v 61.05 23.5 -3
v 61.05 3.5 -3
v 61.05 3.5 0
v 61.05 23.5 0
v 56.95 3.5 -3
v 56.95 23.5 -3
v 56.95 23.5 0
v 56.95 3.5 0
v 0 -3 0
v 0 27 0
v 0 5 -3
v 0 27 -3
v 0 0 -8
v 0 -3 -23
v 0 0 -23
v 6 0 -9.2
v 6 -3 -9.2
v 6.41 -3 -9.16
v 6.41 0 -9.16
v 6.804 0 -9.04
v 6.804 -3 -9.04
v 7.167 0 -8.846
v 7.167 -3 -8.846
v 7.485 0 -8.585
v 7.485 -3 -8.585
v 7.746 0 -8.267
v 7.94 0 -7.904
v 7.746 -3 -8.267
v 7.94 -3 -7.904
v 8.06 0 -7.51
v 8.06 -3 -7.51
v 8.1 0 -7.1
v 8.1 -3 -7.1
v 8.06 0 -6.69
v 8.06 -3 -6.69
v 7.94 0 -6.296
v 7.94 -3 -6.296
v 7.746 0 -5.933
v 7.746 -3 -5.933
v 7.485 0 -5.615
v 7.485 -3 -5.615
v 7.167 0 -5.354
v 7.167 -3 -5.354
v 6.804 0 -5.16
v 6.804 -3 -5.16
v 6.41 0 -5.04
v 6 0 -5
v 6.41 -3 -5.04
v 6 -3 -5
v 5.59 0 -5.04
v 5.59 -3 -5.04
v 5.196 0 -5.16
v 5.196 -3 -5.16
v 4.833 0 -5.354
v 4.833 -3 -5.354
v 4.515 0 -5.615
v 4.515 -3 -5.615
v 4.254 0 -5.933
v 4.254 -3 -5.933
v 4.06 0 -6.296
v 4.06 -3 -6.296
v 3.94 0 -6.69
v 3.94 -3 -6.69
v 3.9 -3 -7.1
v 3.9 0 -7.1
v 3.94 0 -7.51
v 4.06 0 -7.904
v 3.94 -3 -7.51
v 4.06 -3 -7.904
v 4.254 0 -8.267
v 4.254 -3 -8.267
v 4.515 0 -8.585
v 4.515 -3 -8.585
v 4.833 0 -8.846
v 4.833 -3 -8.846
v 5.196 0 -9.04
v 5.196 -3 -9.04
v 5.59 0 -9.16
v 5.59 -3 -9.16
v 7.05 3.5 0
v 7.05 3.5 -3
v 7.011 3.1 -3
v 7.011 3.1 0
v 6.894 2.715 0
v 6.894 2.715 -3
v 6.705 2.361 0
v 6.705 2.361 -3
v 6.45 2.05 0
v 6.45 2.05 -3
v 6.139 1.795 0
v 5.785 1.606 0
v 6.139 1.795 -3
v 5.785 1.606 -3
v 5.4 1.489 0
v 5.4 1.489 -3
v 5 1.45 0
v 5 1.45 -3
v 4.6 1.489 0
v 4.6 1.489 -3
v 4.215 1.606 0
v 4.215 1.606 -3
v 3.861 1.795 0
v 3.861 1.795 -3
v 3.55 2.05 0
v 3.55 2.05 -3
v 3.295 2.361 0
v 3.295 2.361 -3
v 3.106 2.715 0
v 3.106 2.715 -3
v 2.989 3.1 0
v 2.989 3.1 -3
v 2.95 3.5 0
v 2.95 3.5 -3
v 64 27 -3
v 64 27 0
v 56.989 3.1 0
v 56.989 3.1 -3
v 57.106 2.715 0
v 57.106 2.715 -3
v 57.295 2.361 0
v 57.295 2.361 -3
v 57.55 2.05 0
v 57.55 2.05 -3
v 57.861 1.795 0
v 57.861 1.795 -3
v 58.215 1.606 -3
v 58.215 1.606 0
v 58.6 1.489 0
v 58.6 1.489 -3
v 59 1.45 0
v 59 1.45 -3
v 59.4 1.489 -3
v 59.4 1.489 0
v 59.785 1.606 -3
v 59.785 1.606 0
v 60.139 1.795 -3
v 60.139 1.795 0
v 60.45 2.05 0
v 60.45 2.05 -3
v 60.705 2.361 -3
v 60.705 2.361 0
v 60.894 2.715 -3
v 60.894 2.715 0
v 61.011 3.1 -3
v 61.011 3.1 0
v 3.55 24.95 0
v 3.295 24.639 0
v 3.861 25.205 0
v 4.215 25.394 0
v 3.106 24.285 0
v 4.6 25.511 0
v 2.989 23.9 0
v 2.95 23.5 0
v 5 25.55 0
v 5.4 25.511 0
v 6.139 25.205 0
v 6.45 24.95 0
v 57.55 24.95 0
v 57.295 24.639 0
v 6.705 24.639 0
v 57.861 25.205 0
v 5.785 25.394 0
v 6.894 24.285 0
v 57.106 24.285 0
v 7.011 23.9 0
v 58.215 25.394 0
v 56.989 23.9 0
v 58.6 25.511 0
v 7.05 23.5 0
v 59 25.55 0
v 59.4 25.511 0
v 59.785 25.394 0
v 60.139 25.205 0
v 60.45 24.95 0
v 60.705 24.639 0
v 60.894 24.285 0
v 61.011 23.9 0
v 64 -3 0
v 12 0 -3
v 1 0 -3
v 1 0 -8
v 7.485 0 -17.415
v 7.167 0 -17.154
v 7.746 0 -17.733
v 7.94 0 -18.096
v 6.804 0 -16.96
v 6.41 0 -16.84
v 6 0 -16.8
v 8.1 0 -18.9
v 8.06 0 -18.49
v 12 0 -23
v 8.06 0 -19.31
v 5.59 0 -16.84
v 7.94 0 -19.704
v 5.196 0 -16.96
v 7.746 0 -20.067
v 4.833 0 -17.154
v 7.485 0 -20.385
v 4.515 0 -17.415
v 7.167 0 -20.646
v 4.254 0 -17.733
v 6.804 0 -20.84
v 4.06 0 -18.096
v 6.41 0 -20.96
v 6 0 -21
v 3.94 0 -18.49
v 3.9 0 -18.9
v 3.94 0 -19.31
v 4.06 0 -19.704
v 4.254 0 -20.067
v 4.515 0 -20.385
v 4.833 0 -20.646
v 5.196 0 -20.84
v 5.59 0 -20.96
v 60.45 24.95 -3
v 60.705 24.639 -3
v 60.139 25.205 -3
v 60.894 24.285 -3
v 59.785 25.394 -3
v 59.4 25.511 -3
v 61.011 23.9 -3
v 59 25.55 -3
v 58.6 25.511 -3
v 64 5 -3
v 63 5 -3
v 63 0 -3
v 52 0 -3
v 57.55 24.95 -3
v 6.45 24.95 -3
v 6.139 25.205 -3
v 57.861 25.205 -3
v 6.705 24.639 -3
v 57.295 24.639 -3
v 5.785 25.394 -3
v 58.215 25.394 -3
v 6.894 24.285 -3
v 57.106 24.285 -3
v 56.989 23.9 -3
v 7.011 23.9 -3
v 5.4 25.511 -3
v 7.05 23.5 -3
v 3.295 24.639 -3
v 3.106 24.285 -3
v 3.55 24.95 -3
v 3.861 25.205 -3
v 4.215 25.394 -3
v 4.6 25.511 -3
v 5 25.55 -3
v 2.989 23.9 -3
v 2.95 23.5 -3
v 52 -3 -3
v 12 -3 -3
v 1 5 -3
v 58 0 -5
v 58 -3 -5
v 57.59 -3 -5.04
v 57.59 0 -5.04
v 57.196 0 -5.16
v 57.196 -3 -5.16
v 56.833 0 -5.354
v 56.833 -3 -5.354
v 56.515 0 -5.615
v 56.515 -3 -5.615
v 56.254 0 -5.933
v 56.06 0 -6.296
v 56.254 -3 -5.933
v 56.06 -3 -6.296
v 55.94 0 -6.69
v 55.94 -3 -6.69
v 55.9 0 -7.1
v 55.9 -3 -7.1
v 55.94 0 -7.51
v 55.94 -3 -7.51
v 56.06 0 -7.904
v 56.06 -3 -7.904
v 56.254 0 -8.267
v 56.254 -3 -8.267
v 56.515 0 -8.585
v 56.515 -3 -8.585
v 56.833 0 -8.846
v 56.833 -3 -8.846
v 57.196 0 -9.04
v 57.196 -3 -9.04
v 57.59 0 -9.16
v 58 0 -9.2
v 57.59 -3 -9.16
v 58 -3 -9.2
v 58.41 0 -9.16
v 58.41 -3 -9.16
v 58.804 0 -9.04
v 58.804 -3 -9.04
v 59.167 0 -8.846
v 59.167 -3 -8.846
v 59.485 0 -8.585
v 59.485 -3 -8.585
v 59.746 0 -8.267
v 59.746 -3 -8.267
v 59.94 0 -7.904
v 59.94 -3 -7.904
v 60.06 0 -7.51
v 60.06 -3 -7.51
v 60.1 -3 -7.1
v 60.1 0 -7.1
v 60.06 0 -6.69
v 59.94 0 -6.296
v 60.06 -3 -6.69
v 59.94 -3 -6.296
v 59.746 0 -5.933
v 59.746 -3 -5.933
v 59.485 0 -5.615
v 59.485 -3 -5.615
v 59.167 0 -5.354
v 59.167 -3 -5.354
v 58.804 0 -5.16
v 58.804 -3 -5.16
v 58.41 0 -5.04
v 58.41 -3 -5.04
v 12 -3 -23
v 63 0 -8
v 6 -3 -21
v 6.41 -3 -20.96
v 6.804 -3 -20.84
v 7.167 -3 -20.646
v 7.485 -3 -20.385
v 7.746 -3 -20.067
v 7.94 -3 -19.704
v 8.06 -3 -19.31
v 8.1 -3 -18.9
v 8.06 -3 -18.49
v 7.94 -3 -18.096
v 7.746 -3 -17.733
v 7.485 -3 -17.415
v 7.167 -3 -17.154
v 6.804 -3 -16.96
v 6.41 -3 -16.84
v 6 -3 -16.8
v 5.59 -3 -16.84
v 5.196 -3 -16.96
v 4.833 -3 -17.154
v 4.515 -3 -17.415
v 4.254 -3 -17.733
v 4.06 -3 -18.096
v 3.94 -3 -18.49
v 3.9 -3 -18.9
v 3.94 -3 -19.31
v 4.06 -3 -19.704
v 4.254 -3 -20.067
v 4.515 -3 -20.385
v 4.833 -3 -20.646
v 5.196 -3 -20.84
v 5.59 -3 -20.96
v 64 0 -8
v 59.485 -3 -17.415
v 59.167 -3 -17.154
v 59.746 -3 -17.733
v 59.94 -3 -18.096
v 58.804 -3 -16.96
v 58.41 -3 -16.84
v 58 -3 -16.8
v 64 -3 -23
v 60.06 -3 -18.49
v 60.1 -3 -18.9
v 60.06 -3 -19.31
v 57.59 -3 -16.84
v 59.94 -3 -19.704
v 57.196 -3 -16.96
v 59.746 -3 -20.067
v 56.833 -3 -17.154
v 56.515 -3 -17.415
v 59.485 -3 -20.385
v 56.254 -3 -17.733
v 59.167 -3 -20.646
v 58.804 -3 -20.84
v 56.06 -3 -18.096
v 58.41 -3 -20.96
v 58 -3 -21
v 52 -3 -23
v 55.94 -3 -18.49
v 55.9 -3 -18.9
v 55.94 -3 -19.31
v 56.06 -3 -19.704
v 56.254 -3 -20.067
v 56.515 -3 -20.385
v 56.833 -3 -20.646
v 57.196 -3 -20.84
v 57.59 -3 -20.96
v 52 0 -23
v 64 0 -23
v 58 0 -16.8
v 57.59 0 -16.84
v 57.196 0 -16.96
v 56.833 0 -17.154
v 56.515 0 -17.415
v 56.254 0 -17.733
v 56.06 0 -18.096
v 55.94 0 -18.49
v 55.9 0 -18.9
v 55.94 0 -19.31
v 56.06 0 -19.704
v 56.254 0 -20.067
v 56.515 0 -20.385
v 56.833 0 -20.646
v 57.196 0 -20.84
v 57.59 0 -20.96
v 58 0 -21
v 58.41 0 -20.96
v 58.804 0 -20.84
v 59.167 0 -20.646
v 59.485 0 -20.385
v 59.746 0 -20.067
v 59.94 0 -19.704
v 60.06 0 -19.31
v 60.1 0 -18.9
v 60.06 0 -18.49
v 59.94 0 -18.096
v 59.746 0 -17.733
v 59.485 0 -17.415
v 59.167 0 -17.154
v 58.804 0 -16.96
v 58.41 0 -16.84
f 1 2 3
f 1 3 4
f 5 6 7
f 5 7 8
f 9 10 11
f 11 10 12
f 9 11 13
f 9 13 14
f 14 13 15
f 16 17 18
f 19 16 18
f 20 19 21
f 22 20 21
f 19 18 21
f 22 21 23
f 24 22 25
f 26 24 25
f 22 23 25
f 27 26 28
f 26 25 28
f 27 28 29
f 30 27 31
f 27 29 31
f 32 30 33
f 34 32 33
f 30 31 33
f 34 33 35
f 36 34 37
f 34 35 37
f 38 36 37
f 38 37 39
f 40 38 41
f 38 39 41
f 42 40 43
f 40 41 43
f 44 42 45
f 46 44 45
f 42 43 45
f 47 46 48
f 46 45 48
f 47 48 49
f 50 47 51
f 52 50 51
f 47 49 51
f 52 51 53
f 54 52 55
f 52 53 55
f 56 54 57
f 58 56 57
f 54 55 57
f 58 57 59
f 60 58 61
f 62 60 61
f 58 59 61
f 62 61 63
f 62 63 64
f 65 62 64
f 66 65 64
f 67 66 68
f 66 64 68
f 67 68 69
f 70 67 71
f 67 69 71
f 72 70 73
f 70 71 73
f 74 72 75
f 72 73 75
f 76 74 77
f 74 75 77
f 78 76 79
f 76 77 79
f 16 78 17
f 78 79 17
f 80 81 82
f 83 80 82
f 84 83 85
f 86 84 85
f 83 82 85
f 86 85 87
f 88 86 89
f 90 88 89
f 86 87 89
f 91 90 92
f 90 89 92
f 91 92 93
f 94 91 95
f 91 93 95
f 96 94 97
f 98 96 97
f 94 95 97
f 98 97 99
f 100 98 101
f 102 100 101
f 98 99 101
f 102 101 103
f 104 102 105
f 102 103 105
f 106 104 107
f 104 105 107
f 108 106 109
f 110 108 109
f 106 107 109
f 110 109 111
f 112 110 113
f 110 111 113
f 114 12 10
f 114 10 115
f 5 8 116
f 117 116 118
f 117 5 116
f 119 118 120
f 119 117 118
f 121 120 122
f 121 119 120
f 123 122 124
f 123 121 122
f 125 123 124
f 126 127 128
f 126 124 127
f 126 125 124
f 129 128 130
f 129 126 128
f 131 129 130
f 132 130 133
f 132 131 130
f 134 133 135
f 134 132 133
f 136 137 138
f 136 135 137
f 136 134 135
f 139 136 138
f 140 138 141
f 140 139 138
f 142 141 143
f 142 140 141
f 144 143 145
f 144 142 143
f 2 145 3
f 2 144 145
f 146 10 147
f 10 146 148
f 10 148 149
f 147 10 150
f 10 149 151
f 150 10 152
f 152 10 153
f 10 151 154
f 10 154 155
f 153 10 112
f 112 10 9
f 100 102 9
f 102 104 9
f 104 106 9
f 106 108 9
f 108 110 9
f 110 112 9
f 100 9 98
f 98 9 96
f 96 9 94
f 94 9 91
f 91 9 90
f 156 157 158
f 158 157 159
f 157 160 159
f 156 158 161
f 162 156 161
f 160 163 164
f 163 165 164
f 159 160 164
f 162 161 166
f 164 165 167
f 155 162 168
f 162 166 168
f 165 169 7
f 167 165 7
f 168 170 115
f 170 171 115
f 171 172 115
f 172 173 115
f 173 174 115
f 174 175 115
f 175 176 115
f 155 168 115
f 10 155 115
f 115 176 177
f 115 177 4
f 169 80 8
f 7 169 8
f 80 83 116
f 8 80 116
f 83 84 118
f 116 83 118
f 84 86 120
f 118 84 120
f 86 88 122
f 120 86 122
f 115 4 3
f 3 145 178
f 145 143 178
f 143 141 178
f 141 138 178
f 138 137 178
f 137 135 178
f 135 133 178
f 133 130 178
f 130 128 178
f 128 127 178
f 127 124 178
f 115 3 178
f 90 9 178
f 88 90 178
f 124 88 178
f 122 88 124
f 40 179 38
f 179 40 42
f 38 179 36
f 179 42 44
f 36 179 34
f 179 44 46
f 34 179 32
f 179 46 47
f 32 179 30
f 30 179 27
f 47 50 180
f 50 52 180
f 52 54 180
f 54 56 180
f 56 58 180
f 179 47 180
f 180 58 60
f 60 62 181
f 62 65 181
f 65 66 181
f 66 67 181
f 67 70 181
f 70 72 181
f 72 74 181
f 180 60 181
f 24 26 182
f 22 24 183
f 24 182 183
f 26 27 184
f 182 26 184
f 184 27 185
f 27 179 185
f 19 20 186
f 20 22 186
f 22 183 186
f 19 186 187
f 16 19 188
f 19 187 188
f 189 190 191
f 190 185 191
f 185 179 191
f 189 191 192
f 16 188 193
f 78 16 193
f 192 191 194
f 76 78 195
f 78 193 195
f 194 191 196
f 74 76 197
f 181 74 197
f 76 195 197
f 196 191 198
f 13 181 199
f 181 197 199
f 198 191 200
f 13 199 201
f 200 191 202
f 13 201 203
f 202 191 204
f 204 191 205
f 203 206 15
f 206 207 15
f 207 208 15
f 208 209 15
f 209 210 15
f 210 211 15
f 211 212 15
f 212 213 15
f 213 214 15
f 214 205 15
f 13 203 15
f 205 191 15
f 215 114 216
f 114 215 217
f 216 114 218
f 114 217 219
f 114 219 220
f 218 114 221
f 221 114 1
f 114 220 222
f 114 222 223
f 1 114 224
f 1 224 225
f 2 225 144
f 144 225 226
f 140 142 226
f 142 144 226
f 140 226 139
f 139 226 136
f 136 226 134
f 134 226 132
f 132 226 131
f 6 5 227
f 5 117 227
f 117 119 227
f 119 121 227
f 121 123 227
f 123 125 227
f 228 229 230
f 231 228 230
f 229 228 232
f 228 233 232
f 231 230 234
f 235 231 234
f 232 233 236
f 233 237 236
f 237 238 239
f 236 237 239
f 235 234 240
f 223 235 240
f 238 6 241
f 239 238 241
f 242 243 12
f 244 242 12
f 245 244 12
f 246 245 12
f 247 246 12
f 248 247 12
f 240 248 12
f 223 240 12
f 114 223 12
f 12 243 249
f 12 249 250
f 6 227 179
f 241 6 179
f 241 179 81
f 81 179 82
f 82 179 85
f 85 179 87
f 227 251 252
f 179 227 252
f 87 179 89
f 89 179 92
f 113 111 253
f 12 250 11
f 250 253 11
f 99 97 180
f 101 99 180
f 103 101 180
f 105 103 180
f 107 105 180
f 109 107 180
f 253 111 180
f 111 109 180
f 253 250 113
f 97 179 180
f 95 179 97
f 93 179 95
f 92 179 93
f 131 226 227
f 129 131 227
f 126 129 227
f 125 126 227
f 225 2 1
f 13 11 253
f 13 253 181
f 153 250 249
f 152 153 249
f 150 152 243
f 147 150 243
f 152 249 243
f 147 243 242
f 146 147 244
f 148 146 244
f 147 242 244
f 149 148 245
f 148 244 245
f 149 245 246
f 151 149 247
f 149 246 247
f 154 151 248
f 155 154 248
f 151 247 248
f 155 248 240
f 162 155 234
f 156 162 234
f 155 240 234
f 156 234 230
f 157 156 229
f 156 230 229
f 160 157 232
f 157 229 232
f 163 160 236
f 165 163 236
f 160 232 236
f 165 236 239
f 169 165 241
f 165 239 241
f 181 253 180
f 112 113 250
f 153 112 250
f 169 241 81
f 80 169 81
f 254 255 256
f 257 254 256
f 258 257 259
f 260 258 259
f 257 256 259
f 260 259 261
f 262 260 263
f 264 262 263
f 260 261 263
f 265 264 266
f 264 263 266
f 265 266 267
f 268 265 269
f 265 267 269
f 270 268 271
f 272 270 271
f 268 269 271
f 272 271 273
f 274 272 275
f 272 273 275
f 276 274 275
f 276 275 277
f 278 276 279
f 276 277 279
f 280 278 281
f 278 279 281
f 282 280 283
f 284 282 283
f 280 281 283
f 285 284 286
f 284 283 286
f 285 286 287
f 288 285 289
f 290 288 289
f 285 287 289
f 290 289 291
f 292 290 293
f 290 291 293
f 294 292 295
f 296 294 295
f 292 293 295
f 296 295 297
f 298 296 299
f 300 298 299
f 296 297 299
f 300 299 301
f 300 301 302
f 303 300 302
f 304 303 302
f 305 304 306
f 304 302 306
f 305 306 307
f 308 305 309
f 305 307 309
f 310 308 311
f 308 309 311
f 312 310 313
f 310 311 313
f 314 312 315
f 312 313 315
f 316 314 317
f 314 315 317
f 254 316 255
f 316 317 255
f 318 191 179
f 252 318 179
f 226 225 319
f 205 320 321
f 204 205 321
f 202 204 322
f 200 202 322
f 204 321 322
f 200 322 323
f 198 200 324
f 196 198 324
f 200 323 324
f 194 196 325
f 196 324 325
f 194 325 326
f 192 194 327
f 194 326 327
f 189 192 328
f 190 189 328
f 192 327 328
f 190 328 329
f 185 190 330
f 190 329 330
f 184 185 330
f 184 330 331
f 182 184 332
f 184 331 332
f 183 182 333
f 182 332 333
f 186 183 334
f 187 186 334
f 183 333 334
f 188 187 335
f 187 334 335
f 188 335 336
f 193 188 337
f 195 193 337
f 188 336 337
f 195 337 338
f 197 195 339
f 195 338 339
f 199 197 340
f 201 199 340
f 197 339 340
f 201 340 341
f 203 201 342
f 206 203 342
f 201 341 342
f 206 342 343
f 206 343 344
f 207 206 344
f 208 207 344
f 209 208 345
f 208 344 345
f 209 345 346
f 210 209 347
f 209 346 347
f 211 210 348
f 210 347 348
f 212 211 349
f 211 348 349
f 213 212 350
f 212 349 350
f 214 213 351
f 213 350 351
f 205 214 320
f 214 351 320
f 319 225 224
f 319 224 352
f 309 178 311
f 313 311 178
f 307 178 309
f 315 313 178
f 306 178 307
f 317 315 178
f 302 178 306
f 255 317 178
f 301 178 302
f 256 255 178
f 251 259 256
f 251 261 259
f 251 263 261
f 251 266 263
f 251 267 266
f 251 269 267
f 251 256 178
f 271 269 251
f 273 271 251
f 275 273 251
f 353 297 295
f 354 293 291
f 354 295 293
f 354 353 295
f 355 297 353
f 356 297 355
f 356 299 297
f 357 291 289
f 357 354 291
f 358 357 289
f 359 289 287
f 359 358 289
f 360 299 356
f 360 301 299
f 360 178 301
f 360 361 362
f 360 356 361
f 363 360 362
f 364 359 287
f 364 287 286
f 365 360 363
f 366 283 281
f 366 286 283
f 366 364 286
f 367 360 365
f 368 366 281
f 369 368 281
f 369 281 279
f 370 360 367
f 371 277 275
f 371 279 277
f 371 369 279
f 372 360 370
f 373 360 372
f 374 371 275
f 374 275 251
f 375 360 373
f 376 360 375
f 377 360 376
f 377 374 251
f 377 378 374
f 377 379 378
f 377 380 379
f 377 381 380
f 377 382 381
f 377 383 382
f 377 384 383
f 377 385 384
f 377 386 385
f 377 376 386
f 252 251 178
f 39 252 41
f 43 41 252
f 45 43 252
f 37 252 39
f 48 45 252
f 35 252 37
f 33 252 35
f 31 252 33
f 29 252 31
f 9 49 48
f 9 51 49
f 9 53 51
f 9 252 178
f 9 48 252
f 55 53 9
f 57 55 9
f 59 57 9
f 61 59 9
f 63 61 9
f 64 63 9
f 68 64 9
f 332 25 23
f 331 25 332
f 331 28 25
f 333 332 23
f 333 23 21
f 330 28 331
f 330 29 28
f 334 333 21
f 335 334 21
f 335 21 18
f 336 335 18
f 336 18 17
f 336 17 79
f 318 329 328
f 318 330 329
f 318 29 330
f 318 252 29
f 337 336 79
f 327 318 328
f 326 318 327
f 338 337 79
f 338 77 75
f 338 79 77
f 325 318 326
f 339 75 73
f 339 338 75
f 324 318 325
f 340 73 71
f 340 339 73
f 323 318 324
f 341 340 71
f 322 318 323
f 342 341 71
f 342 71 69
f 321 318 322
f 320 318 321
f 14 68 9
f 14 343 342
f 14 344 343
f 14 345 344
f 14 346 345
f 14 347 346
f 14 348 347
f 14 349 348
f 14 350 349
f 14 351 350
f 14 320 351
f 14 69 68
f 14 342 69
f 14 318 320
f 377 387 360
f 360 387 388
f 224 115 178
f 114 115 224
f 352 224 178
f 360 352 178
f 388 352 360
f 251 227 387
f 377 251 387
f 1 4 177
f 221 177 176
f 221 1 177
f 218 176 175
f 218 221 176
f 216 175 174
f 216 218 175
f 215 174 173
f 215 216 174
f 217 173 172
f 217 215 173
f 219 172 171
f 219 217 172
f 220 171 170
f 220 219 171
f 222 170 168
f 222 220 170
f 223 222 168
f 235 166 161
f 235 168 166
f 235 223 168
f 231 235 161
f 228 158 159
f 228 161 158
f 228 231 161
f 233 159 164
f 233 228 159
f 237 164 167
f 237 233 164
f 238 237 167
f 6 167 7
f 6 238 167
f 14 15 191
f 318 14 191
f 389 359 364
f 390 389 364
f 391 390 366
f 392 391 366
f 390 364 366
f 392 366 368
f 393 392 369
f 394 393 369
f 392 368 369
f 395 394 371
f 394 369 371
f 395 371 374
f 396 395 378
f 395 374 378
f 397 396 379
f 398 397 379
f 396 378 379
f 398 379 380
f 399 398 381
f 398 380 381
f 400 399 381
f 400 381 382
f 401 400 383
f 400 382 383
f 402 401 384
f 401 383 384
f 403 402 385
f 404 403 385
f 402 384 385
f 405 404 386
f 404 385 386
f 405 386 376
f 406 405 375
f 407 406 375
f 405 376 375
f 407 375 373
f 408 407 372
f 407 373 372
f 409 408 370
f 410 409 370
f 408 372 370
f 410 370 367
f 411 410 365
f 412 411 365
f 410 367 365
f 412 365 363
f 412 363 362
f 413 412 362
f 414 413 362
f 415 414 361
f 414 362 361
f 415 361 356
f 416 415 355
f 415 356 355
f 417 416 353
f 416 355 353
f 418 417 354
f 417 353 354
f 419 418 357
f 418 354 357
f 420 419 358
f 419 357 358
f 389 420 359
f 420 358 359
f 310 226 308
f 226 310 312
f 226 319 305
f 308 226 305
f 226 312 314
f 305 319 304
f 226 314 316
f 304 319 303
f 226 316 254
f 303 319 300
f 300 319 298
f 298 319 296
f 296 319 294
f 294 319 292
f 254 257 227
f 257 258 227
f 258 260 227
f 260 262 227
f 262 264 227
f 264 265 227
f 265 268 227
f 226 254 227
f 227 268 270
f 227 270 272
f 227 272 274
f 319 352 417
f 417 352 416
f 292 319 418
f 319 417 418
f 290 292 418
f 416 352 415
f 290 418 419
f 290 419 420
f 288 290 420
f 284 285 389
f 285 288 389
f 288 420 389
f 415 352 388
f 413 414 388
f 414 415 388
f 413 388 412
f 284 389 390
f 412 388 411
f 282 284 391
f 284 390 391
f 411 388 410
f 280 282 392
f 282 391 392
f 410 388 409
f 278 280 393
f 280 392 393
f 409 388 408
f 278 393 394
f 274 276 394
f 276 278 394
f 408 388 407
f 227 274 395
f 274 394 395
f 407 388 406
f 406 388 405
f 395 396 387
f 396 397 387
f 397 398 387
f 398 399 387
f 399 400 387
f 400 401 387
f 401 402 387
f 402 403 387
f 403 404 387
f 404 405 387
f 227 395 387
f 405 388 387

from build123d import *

# Parameters (mm, degrees)
BOSS_EXTRUDE1_DEPTH = 3
SKETCH2_R           = 2.1
CUT_EXTRUDE1_DEPTH  = 3
BOSS_EXTRUDE2_DEPTH = 27
CUT_EXTRUDE2_DEPTH  = 27
RIB1_REACH          = 75.171
SKETCH5_WALL_W      = 155.413132852
SKETCH5_WALL_H      = 1
RIB2_REACH          = 75.171
SKETCH6_WALL_W      = 155.413132852
SKETCH6_WALL_H      = 1


with BuildPart() as part:
    # Sketch1 → Boss-Extrude1 (new body)
    with BuildSketch(Plane(origin=(0, 0, 0), x_dir=(1, 0, 0), z_dir=(0, 1, 0))):
        Polygon((0, 0), (0, 23), (12, 23), (12, 3), (52, 3), (52, 23), (64, 23), (64, 0), align=None)
    extrude(amount=-BOSS_EXTRUDE1_DEPTH)

    # Sketch2 → Cut-Extrude1 (cut)
    with BuildSketch(Plane(origin=(0, -3, 0), x_dir=(-1, 0, 0), z_dir=(0, -1, 0))):
        with Locations(Location((-6, 18.9, 0), (0, 0, 90))):
            Circle(SKETCH2_R)
        with Locations(Location((-6, 7.1, 0), (0, 0, 90))):
            Circle(SKETCH2_R)
        with Locations(Location((-58, 7.1, 0), (0, 0, 270))):
            Circle(SKETCH2_R)
        with Locations(Location((-58, 18.9, 0), (0, 0, 270))):
            Circle(SKETCH2_R)
    extrude(amount=-CUT_EXTRUDE1_DEPTH, mode=Mode.SUBTRACT)

    # Sketch3 → Boss-Extrude2 (add)
    with BuildSketch(Plane(origin=(0, 0, 0), x_dir=(1, 0, 0), z_dir=(0, 1, 0))):
        Polygon((52, 3), (12, 3), (0, 3), (0, 0), (64, 0), (64, 3), align=None)
    extrude(amount=BOSS_EXTRUDE2_DEPTH)

    # Sketch4 → Cut-Extrude2 (cut)
    with BuildSketch(Plane(origin=(0, 0, -3), x_dir=(-1, 0, 0), z_dir=(0, 0, -1))):
        with BuildLine():
            Line((-56.95, 23.5), (-56.95, 3.5))
            ThreePointArc((-56.95, 3.5), (-59, 1.45), (-61.05, 3.5))
            Line((-61.05, 3.5), (-61.05, 23.5))
            ThreePointArc((-61.05, 23.5), (-59, 25.55), (-56.95, 23.5))
        make_face()
        with BuildLine():
            Line((-7.05, 23.5), (-7.05, 3.5))
            ThreePointArc((-7.05, 3.5), (-5, 1.45), (-2.95, 3.5))
            Line((-2.95, 3.5), (-2.95, 23.5))
            ThreePointArc((-2.95, 23.5), (-5, 25.55), (-7.05, 23.5))
        make_face()
    extrude(amount=-CUT_EXTRUDE2_DEPTH, mode=Mode.SUBTRACT)

    # Sketch5 wall → Rib1 (add, up to next)
    with BuildSketch(Plane(origin=(64, 2.5, -5.5), x_dir=(0, -0.707106781187, -0.707106781187), z_dir=(0, 0.707106781187, -0.707106781187)), mode=Mode.PRIVATE) as rib1_sk1:
        with Locations((0, 0.5)):
            Rectangle(SKETCH5_WALL_W, SKETCH5_WALL_H)
    rib1_tool1 = extrude(rib1_sk1.sketch, amount=-RIB1_REACH, mode=Mode.PRIVATE) - part.part
    add(rib1_tool1.solids().sort_by_distance((64, 2.5, -5.5))[0])

    # Sketch6 wall → Rib2 (add, up to next)
    with BuildSketch(Plane(origin=(0, 2.5, -5.5), x_dir=(0, -0.707106781187, -0.707106781187), z_dir=(0, 0.707106781187, -0.707106781187)), mode=Mode.PRIVATE) as rib2_sk1:
        with Locations((0, -0.5)):
            Rectangle(SKETCH6_WALL_W, SKETCH6_WALL_H)
    rib2_tool1 = extrude(rib2_sk1.sketch, amount=-RIB2_REACH, mode=Mode.PRIVATE) - part.part
    add(rib2_tool1.solids().sort_by_distance((0, 2.5, -5.5))[0])


solid = part.part
